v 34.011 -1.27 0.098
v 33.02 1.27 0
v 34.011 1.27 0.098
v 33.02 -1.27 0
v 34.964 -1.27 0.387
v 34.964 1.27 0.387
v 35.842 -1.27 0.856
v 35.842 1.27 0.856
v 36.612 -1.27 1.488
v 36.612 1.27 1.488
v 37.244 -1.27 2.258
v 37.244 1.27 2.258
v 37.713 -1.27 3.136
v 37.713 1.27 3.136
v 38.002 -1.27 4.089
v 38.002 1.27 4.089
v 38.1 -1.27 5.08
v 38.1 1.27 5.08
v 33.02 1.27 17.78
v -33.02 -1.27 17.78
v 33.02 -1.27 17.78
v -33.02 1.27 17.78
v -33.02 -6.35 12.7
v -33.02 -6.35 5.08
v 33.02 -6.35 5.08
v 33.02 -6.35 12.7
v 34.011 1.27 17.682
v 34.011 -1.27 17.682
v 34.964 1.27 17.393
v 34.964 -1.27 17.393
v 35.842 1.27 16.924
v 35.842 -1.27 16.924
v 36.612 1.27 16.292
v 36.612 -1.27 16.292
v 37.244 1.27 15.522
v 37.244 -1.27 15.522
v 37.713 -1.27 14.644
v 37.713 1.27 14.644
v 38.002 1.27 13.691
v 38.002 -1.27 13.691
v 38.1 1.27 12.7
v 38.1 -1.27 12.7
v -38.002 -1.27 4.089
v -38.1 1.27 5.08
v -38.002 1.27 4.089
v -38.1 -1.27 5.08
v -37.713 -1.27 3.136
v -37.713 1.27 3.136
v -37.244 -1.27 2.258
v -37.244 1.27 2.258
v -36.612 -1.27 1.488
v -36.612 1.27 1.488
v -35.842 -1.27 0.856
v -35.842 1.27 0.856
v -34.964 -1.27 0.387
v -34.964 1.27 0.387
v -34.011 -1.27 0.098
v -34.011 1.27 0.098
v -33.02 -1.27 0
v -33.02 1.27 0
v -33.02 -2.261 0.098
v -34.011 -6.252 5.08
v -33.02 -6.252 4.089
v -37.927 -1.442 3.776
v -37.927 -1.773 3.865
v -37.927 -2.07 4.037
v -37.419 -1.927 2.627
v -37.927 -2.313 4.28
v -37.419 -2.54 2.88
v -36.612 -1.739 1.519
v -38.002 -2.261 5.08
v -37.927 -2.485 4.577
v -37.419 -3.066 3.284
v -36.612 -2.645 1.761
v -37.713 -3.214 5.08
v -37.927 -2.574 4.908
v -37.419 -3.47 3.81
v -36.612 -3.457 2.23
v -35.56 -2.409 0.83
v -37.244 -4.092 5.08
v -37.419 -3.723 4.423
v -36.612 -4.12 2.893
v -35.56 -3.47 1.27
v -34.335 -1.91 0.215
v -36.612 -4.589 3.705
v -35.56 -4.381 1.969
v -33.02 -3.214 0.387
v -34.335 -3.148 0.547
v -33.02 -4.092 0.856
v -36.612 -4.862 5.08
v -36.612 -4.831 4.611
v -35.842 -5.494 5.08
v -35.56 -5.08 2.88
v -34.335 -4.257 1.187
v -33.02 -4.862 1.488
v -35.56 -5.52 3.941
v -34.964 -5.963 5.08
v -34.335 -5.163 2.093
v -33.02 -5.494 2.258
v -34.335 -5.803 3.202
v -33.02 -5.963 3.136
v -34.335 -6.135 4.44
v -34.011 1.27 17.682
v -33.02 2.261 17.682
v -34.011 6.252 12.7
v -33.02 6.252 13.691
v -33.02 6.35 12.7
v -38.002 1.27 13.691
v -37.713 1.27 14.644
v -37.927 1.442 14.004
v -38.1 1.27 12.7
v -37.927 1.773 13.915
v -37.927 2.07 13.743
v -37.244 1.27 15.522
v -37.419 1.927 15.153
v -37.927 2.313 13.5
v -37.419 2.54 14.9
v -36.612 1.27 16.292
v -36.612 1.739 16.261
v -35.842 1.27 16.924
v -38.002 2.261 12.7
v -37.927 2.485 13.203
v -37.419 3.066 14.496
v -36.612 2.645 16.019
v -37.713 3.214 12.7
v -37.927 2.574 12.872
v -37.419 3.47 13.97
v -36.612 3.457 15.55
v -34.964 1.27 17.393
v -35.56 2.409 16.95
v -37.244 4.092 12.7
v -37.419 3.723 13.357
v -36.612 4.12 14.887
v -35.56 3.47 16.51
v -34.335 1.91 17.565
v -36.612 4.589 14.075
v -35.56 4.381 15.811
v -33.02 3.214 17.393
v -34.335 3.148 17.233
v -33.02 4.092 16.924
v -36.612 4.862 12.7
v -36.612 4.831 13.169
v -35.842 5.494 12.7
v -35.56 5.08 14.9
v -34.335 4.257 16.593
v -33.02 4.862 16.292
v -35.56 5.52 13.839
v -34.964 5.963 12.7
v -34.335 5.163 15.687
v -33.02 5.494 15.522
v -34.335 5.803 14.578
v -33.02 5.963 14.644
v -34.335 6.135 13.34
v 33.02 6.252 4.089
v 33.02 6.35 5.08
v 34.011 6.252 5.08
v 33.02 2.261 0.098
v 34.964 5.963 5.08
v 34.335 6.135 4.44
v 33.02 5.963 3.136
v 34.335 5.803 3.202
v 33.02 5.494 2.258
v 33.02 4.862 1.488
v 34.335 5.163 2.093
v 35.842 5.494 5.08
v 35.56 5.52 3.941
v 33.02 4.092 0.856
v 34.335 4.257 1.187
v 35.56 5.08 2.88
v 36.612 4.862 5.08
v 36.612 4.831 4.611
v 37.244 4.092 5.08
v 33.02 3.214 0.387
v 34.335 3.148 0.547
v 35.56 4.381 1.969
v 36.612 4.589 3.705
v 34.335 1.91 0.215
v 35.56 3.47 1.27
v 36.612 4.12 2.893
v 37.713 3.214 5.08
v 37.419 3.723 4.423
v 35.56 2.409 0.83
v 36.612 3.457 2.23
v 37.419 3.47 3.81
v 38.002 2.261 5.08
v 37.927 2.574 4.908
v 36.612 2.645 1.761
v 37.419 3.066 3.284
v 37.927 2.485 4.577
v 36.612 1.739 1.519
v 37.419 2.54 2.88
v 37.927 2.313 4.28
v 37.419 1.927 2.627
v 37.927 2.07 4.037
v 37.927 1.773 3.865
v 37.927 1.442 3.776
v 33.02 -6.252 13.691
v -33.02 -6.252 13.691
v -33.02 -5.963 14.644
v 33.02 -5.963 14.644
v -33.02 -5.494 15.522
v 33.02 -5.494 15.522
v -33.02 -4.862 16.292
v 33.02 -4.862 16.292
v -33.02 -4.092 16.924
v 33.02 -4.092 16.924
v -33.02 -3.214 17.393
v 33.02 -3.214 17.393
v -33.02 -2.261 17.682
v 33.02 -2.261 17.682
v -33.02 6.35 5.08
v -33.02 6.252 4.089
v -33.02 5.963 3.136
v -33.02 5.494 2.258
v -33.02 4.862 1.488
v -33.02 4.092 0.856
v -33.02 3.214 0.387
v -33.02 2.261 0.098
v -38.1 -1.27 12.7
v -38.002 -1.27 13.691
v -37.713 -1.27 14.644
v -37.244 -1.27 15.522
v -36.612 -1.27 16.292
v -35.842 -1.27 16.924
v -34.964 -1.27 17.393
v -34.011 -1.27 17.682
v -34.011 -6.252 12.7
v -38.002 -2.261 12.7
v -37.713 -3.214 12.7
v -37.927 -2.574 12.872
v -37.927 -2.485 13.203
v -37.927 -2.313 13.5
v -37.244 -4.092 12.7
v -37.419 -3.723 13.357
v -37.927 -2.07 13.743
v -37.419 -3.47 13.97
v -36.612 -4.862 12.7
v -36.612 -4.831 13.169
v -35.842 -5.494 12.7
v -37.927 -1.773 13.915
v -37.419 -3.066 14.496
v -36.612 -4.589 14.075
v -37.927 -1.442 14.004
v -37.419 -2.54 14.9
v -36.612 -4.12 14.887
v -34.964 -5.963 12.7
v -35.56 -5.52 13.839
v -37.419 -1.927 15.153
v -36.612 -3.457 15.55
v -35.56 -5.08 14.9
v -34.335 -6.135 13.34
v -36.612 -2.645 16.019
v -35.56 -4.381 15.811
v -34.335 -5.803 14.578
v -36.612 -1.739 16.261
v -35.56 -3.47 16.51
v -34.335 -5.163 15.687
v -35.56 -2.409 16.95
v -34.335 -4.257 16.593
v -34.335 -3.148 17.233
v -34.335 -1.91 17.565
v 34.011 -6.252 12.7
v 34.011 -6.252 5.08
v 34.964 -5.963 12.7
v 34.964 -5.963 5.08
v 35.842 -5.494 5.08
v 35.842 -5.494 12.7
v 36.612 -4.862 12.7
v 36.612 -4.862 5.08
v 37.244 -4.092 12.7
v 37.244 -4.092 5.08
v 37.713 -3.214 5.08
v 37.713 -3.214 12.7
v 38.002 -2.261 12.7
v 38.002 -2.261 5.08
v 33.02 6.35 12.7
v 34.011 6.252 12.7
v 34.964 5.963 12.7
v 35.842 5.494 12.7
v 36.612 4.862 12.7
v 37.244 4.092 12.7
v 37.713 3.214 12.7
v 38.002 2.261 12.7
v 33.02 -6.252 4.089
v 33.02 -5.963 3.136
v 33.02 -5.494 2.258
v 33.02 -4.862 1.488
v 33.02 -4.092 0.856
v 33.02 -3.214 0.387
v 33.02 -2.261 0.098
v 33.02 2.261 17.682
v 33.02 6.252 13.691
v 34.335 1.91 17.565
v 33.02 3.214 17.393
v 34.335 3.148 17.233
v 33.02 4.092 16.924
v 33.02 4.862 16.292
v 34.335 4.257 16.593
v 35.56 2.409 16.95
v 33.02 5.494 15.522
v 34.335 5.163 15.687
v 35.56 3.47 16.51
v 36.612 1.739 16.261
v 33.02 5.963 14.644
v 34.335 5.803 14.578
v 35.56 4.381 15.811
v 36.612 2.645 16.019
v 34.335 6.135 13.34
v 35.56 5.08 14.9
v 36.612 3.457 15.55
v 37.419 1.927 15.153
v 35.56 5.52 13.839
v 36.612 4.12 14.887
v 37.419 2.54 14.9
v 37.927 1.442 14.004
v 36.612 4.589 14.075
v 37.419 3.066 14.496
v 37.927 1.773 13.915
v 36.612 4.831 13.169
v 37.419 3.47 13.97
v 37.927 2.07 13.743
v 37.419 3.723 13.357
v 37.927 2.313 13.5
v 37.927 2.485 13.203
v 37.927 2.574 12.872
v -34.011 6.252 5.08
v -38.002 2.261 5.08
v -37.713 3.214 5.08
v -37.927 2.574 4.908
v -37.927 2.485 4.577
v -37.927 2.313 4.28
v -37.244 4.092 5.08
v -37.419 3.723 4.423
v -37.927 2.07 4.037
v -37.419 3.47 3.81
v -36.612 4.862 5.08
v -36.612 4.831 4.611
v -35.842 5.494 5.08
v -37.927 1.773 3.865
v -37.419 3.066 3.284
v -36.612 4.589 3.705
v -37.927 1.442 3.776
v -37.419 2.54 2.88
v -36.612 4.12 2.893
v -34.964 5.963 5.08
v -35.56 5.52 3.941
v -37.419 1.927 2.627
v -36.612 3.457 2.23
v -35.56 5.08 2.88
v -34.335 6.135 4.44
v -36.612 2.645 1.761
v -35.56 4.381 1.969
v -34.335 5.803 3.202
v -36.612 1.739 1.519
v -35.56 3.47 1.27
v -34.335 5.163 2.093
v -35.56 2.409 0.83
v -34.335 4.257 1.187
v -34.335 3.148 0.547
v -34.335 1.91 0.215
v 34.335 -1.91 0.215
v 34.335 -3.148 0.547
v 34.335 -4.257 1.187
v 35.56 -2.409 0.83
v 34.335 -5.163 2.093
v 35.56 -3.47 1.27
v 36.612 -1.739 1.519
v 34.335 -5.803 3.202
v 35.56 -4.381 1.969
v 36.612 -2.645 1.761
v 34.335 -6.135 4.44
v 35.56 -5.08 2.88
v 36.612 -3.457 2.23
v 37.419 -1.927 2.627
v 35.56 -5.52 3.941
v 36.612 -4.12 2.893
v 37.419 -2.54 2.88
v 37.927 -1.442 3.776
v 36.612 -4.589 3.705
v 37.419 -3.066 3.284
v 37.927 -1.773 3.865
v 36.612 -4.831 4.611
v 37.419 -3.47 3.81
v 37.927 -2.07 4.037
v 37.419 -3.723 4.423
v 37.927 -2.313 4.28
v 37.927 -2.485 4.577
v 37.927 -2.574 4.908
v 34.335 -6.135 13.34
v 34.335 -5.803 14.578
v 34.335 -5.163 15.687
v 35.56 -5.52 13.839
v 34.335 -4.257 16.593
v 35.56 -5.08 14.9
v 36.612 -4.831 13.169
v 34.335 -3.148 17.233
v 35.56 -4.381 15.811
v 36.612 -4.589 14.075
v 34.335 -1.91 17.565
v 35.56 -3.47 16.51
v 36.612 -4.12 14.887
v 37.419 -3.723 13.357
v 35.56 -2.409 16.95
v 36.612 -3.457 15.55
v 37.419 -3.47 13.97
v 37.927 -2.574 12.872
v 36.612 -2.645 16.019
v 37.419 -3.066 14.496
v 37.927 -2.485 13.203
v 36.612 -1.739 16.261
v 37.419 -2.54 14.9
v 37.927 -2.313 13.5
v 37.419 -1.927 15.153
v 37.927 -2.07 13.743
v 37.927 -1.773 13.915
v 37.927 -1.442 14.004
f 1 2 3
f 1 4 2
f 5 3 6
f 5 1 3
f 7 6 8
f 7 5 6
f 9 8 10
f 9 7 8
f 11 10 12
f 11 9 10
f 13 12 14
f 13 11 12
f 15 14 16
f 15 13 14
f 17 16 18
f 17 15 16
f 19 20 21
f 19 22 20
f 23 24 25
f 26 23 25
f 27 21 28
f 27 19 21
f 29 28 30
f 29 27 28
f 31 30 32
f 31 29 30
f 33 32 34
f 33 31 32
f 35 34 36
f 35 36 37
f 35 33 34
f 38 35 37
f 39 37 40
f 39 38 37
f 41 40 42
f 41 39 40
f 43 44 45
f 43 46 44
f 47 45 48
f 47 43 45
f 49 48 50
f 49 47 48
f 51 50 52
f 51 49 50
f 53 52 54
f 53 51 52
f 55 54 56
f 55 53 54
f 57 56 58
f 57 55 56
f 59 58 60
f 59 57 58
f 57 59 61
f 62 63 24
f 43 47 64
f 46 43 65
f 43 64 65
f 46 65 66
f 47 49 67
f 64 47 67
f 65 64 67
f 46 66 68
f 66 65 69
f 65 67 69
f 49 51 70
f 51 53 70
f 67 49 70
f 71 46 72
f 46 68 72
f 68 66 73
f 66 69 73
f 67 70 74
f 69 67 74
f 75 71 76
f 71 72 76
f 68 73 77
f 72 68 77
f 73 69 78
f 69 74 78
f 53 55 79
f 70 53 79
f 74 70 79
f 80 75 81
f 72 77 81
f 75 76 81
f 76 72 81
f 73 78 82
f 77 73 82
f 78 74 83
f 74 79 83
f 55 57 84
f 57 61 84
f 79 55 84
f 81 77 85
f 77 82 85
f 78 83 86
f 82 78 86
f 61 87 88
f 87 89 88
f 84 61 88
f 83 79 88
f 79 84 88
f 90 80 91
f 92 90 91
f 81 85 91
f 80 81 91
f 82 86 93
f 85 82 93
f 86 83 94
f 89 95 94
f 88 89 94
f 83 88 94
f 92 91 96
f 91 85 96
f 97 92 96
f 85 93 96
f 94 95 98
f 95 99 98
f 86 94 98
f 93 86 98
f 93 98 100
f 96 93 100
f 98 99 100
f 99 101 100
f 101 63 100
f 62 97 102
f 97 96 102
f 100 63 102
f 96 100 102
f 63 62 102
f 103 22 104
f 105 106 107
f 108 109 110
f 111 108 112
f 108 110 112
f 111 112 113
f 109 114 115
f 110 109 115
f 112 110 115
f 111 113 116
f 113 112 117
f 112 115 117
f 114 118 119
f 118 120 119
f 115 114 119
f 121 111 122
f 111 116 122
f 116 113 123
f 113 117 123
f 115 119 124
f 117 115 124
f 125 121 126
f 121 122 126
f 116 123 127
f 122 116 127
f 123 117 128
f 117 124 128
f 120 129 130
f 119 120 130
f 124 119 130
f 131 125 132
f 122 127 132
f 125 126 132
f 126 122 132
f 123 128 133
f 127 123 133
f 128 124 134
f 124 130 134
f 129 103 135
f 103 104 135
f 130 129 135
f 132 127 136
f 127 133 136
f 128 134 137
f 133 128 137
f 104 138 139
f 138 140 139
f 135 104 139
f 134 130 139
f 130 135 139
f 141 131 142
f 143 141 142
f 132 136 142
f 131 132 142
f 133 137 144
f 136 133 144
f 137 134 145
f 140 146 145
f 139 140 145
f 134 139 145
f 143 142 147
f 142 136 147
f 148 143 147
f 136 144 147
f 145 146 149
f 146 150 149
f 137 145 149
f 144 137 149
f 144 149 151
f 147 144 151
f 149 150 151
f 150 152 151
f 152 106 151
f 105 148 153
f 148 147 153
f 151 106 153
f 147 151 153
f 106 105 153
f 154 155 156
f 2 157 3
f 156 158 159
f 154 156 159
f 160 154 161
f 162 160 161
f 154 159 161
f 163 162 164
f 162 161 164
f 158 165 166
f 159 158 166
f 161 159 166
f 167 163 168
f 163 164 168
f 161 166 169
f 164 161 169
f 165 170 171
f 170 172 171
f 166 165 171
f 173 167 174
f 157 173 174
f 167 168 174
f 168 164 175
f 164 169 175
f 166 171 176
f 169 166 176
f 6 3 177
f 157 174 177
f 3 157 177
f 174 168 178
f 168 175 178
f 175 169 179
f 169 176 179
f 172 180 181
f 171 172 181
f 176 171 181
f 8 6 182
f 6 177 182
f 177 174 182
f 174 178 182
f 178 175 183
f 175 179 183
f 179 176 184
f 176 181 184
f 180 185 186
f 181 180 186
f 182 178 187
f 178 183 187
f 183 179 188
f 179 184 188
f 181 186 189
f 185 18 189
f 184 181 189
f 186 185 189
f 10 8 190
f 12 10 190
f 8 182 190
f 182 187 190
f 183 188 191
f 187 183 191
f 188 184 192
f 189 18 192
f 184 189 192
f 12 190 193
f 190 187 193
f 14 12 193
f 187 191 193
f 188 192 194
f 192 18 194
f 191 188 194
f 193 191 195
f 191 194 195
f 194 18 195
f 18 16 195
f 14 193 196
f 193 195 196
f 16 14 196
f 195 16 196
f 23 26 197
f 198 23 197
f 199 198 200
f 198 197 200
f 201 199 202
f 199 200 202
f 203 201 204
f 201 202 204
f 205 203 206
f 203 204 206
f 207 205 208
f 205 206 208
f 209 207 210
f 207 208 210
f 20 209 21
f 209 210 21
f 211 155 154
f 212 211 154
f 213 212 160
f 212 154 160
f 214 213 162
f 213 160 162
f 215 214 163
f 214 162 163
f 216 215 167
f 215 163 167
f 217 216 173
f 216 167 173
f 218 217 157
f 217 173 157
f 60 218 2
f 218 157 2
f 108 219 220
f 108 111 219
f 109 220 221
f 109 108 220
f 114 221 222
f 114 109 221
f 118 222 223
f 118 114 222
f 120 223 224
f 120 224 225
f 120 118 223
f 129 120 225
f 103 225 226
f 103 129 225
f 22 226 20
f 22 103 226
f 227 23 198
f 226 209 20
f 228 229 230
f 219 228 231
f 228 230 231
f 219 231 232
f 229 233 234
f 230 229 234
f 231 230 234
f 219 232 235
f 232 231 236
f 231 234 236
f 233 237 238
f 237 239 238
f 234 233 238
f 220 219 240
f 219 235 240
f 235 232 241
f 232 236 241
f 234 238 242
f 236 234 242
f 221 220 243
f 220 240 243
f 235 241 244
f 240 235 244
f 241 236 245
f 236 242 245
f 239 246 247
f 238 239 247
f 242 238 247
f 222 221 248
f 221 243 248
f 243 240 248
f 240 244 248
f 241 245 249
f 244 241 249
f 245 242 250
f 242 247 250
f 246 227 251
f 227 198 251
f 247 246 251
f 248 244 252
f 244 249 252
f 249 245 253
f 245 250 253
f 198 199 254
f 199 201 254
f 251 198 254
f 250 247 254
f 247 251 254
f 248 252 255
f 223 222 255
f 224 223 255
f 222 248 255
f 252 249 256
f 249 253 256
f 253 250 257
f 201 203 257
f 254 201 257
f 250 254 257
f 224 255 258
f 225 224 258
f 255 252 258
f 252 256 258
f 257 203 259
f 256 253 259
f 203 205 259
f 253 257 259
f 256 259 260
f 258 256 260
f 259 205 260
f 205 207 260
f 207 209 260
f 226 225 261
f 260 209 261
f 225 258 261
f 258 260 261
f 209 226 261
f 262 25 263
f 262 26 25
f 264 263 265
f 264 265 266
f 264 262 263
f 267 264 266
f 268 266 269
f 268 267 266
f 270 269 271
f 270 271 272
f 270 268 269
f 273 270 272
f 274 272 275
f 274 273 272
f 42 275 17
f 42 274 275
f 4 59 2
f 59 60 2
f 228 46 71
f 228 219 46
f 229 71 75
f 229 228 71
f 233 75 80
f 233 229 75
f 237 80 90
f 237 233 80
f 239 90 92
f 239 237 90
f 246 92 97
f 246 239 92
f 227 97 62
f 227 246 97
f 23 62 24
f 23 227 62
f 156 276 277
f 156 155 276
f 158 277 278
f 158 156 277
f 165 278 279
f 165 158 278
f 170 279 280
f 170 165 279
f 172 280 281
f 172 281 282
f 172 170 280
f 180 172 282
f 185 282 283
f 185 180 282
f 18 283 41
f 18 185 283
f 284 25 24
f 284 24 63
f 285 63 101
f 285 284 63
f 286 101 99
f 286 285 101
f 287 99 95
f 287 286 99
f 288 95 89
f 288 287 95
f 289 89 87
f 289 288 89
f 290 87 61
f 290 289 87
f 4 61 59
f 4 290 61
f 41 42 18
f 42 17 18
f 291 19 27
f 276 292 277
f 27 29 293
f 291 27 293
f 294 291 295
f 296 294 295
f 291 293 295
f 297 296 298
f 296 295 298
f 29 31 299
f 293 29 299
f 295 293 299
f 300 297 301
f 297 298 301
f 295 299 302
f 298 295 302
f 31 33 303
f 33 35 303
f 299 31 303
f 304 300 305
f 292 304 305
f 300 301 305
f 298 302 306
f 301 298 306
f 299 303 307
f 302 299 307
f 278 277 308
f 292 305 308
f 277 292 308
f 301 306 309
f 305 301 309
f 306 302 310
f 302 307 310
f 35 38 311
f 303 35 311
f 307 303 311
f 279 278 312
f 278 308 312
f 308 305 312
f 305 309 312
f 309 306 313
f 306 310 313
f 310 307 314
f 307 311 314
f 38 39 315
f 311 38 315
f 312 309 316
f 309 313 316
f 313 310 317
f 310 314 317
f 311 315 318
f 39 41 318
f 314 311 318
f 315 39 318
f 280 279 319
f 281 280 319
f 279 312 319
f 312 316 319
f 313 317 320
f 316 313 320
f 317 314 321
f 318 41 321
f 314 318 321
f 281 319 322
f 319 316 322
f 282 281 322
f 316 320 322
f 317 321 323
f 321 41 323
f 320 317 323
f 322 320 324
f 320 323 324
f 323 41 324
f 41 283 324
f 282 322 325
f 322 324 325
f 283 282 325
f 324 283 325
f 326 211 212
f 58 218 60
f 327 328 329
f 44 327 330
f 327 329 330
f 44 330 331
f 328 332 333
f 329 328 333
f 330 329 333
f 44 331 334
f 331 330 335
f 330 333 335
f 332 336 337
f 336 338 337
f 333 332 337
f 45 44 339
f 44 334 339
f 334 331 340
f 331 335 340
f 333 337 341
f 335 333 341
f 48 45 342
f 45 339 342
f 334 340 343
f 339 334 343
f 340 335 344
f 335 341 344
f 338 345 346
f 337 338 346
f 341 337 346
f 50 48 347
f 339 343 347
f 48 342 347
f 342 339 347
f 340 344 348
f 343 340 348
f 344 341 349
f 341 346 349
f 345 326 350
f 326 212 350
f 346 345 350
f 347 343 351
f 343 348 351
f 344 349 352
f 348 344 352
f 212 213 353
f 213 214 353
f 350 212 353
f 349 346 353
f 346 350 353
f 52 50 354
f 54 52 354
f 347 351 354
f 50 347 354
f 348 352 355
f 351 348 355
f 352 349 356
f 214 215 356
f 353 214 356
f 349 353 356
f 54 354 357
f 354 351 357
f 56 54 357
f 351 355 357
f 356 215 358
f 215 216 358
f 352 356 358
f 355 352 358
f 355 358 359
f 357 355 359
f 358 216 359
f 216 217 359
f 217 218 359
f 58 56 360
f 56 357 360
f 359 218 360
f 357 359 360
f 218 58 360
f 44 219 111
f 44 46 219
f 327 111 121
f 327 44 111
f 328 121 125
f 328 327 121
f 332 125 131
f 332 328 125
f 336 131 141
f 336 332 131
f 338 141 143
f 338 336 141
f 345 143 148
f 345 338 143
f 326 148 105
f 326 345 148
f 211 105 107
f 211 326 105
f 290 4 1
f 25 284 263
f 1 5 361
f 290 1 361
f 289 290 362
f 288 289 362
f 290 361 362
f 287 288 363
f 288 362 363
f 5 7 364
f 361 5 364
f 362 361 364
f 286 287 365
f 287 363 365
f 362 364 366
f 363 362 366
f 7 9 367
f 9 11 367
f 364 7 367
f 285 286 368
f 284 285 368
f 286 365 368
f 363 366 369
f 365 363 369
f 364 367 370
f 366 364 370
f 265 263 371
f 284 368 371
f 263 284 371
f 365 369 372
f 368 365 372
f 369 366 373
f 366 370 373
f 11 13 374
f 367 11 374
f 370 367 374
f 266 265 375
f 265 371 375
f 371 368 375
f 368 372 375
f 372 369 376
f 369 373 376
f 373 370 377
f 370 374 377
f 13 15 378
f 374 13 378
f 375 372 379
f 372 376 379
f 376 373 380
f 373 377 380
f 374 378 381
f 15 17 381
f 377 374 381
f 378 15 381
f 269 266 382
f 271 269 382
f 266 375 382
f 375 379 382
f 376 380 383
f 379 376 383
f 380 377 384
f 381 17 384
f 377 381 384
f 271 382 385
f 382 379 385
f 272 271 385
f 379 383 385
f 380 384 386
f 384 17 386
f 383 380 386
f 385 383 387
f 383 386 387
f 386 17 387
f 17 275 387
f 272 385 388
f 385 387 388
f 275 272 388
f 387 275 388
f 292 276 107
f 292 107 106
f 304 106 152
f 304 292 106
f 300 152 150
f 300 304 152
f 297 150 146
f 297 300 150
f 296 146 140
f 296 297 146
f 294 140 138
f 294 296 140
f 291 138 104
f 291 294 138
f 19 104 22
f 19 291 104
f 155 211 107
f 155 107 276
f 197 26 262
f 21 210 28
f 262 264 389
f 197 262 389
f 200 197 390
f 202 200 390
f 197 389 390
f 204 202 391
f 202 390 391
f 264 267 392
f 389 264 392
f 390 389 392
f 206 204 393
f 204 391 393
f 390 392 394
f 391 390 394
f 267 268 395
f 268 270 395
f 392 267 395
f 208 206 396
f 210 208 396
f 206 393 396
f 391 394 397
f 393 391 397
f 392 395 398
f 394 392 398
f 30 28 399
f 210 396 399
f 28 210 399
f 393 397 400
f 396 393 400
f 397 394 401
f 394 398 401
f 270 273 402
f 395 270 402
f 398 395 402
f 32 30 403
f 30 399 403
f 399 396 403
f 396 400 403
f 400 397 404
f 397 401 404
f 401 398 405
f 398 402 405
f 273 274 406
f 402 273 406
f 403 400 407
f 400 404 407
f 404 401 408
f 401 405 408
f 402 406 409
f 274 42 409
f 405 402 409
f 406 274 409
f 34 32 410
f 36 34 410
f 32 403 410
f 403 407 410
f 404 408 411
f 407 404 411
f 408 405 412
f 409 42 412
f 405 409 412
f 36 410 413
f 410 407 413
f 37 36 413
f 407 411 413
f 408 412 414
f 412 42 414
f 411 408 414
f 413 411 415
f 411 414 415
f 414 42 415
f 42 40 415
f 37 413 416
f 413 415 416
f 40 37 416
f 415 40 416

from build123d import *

# Parameters (mm, degrees)
F0_W     = 76.2
F0_H     = 12.7
F1_DEPTH = 17.78
F2_R     = 5.08
F3_R     = 5.08
F4_R     = 5.08


with BuildPart() as f1:
    # F0 (on Top) → F1 (new body)
    with BuildSketch(Plane.XY):
        Rectangle(F0_W, F0_H)
    extrude(amount=F1_DEPTH)

    # F2
    f2_edges = [f1.edges().sort_by_distance(p)[0] for p in [
        (0, 6.35, 17.78),
        (0, -6.35, 17.78),
        (0, 6.35, 0),
        (0, -6.35, 0),
    ]]
    fillet(f2_edges, radius=F2_R)

    # F3
    f3_edges = [f1.edges().sort_by_distance(p)[0] for p in [
        (-38.1, 0, 17.78),
        (-38.1, -4.862102, 16.292102),
        (-38.1, 4.862102, 16.292102),
        (-38.1, 6.35, 8.89),
        (-38.1, -6.35, 8.89),
        (-38.1, -4.862102, 1.487898),
        (-38.1, 0, 0),
        (-38.1, 4.862102, 1.487898),
    ]]
    fillet(f3_edges, radius=F3_R)

    # F4
    f4_edges = [f1.edges().sort_by_distance(p)[0] for p in [
        (38.1, -4.862102, 16.292102),
        (38.1, 0, 17.78),
        (38.1, 4.862102, 16.292102),
        (38.1, 6.35, 8.89),
        (38.1, 4.862102, 1.487898),
        (38.1, 0, 0),
        (38.1, -4.862102, 1.487898),
        (38.1, -6.35, 8.89),
    ]]
    fillet(f4_edges, radius=F4_R)


solid = f1.part
